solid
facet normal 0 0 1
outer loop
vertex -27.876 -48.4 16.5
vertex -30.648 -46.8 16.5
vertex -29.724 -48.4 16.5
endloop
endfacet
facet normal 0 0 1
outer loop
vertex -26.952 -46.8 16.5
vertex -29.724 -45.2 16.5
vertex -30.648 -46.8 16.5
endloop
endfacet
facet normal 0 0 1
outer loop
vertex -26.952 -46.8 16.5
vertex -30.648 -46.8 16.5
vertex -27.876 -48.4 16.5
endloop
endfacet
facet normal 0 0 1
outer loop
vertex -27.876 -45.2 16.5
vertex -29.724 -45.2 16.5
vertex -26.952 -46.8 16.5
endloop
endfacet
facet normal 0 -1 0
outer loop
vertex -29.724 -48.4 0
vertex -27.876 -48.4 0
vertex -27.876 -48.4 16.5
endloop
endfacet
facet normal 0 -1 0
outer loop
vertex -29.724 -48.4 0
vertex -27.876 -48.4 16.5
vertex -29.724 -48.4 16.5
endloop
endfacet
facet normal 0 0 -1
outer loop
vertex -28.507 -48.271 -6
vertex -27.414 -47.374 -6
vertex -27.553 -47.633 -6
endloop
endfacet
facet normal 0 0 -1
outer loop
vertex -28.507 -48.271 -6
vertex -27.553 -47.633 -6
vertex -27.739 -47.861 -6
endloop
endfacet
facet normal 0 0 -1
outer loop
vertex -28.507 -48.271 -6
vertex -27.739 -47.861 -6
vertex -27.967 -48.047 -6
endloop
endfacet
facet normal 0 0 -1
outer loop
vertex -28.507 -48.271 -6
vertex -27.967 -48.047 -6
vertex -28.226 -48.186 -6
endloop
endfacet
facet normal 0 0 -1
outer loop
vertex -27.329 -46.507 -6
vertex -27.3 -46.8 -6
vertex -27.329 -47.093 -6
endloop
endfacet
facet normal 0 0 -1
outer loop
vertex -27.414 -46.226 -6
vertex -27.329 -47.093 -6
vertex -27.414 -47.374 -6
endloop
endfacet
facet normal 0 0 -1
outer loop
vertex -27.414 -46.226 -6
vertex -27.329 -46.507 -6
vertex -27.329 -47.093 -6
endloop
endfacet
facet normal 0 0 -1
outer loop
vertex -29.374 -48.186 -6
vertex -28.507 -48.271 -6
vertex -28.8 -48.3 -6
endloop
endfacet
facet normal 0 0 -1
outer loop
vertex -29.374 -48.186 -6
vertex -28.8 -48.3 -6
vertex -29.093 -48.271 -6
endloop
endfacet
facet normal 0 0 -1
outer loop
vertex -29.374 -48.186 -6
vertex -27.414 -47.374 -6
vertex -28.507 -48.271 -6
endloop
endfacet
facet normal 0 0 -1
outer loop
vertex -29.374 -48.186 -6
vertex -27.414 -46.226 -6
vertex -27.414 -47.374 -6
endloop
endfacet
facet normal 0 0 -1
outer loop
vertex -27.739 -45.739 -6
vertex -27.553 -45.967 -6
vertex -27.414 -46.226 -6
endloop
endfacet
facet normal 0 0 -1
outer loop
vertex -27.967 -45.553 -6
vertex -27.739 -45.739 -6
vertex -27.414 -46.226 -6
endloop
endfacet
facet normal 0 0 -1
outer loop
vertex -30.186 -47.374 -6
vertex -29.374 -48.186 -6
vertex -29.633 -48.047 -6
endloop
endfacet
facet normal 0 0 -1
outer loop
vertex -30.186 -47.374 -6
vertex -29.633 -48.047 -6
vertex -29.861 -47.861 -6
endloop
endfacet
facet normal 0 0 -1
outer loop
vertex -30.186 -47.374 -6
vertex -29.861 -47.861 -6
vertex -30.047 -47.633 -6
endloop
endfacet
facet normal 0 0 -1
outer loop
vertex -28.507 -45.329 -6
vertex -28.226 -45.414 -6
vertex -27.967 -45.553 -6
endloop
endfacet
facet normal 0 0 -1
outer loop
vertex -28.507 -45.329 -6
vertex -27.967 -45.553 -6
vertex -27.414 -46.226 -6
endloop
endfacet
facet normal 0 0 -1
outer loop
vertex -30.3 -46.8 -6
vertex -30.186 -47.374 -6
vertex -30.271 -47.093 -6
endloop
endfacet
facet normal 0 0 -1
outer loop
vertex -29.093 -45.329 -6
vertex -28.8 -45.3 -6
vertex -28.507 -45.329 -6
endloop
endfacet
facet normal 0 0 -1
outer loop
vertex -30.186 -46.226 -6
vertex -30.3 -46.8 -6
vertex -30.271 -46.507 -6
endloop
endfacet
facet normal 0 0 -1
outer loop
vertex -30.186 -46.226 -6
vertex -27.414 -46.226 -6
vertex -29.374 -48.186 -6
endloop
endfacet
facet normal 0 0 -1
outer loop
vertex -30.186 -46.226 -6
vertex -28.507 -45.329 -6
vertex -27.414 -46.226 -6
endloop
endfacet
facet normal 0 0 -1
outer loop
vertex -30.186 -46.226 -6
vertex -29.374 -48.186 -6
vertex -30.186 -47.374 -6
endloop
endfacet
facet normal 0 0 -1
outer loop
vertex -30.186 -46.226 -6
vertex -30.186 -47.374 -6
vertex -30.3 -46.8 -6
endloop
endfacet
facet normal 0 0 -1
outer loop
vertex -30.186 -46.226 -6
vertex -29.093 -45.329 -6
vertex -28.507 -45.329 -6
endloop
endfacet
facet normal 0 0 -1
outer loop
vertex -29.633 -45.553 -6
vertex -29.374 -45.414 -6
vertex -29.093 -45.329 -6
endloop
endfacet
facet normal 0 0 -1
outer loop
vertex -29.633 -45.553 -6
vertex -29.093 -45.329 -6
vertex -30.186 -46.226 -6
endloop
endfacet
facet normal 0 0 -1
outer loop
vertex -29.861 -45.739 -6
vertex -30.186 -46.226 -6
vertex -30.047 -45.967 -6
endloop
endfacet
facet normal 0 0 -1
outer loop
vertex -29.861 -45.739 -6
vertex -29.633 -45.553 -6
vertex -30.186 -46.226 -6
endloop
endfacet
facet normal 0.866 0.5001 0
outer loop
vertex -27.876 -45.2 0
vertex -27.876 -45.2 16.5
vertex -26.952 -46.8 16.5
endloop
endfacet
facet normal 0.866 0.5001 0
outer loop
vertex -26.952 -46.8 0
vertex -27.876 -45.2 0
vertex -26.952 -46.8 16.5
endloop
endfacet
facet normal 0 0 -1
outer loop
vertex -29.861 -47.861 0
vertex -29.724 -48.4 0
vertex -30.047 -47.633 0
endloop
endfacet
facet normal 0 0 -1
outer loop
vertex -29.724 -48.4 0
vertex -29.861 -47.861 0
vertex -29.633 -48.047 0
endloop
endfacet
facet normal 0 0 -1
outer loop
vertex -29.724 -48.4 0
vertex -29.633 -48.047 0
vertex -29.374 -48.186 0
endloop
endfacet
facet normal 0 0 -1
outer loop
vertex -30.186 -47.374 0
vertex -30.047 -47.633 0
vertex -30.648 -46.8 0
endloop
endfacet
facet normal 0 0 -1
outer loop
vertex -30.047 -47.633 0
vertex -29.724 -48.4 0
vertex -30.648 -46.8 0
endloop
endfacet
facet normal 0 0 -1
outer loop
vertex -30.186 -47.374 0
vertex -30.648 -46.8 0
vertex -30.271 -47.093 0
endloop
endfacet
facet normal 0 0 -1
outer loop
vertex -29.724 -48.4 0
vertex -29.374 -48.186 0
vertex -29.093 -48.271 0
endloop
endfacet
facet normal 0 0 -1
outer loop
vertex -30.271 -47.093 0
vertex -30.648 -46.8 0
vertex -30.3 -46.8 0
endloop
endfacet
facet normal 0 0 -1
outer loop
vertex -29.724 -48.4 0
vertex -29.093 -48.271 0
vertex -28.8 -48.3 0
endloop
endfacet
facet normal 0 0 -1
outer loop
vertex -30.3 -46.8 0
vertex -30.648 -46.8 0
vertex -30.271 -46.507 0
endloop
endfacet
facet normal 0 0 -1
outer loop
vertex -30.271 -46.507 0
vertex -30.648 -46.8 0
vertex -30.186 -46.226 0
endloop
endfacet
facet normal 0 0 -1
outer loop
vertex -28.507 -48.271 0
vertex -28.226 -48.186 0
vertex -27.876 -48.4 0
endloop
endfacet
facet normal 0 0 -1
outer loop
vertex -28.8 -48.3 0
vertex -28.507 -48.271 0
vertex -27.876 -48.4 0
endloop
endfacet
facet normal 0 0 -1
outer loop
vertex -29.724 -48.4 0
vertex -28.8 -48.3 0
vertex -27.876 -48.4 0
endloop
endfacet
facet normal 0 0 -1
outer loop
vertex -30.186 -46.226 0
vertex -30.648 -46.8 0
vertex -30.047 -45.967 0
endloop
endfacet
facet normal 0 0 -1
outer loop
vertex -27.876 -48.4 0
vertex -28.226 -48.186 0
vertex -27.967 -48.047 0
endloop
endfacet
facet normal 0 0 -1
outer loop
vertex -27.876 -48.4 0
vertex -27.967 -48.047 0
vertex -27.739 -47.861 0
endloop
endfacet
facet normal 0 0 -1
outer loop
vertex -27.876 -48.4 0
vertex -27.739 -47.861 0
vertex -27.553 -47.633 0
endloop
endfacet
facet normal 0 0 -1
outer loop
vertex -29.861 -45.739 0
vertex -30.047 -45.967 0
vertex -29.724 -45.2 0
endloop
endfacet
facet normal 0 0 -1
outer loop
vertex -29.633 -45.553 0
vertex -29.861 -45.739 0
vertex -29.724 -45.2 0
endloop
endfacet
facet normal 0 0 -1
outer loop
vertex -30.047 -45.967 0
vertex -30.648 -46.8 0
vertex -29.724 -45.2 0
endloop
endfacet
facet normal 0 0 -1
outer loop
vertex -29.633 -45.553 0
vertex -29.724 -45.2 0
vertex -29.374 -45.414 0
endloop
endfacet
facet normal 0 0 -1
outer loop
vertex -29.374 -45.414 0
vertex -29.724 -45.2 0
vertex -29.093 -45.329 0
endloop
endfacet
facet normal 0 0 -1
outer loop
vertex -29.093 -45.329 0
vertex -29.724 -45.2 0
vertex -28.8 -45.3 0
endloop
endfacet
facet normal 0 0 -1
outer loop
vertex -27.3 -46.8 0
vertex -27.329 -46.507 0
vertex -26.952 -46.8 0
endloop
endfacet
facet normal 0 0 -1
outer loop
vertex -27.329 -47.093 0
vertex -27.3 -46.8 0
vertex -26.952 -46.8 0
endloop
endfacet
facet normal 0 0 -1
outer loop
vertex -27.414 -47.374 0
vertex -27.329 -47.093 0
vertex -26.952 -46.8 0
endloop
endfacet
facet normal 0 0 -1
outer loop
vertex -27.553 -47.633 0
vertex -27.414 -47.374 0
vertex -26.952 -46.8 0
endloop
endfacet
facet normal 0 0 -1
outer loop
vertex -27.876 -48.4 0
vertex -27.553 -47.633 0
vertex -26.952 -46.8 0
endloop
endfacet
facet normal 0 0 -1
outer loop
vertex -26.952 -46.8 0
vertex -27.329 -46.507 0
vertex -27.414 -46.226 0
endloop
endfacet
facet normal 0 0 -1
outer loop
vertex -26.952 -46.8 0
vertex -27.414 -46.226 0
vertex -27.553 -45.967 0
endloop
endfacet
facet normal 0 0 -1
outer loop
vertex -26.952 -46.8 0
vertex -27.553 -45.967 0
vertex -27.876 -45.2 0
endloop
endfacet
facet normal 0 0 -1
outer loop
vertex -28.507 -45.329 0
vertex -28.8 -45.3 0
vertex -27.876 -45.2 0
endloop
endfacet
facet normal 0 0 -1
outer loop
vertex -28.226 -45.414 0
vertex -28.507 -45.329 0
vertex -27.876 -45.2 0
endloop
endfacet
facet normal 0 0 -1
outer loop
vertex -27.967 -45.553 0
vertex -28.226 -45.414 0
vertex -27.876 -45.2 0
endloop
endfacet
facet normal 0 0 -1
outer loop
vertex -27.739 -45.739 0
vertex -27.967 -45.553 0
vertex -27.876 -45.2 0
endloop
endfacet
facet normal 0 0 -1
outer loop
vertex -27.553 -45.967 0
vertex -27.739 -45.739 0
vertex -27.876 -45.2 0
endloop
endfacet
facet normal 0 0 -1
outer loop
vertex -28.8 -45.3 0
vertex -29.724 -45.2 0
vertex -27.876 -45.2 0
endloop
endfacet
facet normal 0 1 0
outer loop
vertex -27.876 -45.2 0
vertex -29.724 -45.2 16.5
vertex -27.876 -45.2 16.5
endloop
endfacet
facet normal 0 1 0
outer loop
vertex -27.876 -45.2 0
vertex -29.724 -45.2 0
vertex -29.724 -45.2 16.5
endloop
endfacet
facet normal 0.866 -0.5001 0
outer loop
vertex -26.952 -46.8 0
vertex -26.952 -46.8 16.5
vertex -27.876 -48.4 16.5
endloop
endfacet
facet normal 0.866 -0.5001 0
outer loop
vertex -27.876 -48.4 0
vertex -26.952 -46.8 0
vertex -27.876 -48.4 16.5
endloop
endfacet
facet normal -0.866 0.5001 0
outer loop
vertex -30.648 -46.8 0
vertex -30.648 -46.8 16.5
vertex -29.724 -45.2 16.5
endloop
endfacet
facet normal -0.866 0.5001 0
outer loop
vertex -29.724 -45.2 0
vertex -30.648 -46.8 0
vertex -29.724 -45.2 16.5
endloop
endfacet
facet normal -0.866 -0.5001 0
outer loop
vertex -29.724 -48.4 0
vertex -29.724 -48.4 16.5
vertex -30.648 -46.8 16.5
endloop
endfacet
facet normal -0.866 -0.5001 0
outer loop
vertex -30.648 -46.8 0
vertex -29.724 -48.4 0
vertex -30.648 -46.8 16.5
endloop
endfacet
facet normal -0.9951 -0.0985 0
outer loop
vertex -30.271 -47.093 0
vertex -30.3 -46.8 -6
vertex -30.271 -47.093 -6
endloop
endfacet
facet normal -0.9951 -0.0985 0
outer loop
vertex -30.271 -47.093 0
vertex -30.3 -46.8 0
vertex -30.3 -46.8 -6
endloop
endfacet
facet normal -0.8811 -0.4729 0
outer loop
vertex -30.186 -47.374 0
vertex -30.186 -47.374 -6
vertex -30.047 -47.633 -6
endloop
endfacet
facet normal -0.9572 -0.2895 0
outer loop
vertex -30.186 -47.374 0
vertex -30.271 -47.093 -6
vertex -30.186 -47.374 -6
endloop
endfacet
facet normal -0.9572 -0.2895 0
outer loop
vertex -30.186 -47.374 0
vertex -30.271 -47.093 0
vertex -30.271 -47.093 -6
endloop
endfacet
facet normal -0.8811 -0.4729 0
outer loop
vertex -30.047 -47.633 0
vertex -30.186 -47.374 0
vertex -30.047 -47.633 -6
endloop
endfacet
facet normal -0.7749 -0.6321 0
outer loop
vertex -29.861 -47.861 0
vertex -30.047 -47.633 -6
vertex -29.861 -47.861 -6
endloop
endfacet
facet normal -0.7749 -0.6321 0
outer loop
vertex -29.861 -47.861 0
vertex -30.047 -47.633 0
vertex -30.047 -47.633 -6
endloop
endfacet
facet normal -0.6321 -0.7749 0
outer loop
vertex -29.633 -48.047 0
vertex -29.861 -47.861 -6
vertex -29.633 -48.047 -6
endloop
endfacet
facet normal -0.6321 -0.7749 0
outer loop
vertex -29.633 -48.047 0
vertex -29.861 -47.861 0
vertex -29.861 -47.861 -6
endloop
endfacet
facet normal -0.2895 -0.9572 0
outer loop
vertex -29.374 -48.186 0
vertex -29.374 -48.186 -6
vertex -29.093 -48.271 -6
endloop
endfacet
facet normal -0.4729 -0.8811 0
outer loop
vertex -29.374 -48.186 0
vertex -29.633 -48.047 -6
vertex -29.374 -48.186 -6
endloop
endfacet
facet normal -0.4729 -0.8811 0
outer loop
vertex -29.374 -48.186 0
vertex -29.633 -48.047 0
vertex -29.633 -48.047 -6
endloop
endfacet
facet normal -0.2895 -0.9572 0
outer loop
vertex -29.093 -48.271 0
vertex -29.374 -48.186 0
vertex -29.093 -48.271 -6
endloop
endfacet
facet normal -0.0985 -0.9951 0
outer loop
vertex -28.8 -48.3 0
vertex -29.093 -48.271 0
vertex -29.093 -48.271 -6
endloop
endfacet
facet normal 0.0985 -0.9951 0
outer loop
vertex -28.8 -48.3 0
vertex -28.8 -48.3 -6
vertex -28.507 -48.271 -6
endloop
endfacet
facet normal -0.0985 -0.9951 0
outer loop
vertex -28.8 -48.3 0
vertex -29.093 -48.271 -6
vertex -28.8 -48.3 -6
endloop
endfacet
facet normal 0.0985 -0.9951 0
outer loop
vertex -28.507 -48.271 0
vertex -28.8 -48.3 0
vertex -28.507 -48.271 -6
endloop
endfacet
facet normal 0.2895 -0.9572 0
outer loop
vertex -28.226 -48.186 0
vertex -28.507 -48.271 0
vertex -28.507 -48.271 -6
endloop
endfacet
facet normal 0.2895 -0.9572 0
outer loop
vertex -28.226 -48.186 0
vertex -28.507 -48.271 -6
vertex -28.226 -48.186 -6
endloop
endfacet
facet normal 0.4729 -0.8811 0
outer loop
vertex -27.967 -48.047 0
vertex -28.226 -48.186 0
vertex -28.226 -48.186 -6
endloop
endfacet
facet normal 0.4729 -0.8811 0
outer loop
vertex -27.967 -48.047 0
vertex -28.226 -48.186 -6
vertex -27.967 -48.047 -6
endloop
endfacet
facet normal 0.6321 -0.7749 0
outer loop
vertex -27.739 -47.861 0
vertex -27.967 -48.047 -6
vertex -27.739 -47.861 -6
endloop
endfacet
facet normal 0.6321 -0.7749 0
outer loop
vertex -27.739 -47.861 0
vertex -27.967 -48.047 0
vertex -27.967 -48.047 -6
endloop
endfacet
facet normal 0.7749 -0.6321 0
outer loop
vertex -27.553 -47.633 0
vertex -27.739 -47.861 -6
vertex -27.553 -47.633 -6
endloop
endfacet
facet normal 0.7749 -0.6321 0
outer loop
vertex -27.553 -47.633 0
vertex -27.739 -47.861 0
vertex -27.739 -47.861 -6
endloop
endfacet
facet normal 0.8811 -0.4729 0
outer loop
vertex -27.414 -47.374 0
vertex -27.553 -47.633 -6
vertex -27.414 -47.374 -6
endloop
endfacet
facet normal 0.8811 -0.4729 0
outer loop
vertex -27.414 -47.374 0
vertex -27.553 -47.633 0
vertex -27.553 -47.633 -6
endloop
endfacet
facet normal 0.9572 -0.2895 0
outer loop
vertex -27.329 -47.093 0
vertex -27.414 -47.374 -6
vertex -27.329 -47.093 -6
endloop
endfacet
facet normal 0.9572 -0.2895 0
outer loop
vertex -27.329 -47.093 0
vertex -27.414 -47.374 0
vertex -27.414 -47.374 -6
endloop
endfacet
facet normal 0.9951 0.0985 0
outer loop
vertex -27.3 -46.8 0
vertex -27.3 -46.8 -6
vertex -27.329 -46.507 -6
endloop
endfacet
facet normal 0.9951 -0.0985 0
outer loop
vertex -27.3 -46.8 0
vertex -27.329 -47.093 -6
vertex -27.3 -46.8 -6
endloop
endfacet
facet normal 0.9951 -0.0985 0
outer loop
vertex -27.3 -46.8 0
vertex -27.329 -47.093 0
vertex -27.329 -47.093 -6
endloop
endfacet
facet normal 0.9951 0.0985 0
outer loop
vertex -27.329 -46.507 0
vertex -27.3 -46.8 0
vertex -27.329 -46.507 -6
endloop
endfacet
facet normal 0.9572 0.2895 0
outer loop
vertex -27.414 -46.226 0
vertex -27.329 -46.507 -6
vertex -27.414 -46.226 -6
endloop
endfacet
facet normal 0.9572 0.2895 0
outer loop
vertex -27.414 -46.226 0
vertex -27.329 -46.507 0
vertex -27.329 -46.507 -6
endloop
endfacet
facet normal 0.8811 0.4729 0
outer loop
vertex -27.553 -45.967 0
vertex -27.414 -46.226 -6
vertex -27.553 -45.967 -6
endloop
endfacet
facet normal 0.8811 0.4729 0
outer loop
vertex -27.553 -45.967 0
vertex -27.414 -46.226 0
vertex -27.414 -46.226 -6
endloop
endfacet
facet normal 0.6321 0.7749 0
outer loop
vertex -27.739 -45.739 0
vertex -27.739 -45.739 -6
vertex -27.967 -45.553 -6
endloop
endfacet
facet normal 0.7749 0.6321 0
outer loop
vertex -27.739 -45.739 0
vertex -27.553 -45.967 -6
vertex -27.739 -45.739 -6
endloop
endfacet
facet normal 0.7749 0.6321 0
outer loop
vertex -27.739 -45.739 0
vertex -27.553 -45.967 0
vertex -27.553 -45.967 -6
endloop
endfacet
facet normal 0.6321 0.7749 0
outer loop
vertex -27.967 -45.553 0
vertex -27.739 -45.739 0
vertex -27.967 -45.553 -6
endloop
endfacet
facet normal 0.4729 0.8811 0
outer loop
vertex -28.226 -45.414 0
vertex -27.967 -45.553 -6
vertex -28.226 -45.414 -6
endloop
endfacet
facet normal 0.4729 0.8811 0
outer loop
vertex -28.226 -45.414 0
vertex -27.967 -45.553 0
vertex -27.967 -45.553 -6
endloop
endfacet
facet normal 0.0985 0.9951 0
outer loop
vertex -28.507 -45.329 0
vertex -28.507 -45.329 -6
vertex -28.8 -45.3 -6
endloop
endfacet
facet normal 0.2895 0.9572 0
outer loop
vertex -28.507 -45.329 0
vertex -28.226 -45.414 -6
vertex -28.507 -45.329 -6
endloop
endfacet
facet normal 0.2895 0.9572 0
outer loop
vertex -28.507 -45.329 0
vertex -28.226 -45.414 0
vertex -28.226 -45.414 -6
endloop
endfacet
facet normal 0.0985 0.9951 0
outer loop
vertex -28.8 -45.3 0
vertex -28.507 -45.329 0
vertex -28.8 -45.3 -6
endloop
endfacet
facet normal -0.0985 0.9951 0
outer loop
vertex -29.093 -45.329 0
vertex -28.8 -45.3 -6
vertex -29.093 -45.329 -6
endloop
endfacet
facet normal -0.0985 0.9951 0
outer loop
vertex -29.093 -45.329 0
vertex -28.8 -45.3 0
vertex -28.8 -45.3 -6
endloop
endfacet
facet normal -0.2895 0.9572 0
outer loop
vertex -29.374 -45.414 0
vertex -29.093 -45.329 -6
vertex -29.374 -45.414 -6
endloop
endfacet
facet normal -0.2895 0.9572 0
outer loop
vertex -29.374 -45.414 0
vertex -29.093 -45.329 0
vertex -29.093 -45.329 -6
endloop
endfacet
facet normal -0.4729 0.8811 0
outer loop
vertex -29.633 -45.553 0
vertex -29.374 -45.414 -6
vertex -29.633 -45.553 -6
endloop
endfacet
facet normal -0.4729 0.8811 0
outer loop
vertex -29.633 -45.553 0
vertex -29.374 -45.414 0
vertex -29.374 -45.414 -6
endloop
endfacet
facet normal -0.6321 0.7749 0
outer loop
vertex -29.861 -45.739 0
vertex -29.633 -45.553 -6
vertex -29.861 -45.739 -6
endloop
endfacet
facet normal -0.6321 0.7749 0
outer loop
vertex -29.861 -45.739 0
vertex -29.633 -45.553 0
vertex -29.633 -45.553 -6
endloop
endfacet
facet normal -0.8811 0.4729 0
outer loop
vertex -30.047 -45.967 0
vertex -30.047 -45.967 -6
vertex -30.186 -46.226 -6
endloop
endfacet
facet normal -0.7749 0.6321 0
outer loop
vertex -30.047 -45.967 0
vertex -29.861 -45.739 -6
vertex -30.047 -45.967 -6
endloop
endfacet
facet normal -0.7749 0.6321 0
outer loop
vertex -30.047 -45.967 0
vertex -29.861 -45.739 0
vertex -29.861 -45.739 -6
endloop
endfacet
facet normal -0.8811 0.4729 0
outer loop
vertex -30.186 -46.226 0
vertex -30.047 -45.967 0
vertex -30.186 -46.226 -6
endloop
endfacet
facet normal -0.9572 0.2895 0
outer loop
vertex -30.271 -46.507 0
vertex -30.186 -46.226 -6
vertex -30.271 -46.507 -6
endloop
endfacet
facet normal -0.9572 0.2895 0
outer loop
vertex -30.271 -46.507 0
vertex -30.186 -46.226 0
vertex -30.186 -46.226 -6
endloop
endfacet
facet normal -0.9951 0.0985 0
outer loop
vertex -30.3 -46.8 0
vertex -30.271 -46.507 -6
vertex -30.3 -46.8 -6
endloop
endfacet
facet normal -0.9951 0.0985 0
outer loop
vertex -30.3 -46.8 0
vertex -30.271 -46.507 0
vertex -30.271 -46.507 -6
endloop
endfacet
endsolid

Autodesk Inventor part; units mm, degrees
ref_plane "YZ Plane" through (0, 0, 0) normal (1, 0, 0) x (0, 1, 0)
ref_plane "XZ Plane" through (0, 0, 0) normal (0, 1, 0) x (-1, 0, 0)
ref_plane "XY Plane" through (0, 0, 0) normal (0, 0, 1) x (1, 0, 0)
ref_plane "Work Plane1" through (0, 0, 0) normal (0, 0, 1) x (1, 0, 0)
sketch "Sketch1" plane through (0, 0, 0) normal (0, 0, 1) x (1, 0, 0)
  circle A0 centre (-28.8, -46.8) radius 1.6 projected
  line L0 (-27.8762, -45.2) -> (-26.9525, -46.8)
  line L1 (-26.9525, -46.8) -> (-27.8762, -48.4)
  line L2 (-27.8762, -48.4) -> (-29.7238, -48.4)
  line L3 (-29.7238, -48.4) -> (-30.6475, -46.8)
  line L4 (-30.6475, -46.8) -> (-29.7238, -45.2)
  line L5 (-29.7238, -45.2) -> (-27.8762, -45.2)
  point P0 (0, 0)
  point P1 (-28.8, -45.2)
extrude "Extrusion1" add sketch "Sketch1" along normal blind 16.5
sketch "Sketch2" plane through (0, 0, 0) normal (0, 0, -1) x (-1, 0, 0)
  circle A0 centre (28.8, -46.8) radius 1.5
  point P0 (0, 0)
  dimension "d2" = 3
extrude "Extrusion2" add sketch "Sketch2" along normal blind 6
properties part number "nanopc_t4_spacer_long" material "Brass, Soft Yellow"
